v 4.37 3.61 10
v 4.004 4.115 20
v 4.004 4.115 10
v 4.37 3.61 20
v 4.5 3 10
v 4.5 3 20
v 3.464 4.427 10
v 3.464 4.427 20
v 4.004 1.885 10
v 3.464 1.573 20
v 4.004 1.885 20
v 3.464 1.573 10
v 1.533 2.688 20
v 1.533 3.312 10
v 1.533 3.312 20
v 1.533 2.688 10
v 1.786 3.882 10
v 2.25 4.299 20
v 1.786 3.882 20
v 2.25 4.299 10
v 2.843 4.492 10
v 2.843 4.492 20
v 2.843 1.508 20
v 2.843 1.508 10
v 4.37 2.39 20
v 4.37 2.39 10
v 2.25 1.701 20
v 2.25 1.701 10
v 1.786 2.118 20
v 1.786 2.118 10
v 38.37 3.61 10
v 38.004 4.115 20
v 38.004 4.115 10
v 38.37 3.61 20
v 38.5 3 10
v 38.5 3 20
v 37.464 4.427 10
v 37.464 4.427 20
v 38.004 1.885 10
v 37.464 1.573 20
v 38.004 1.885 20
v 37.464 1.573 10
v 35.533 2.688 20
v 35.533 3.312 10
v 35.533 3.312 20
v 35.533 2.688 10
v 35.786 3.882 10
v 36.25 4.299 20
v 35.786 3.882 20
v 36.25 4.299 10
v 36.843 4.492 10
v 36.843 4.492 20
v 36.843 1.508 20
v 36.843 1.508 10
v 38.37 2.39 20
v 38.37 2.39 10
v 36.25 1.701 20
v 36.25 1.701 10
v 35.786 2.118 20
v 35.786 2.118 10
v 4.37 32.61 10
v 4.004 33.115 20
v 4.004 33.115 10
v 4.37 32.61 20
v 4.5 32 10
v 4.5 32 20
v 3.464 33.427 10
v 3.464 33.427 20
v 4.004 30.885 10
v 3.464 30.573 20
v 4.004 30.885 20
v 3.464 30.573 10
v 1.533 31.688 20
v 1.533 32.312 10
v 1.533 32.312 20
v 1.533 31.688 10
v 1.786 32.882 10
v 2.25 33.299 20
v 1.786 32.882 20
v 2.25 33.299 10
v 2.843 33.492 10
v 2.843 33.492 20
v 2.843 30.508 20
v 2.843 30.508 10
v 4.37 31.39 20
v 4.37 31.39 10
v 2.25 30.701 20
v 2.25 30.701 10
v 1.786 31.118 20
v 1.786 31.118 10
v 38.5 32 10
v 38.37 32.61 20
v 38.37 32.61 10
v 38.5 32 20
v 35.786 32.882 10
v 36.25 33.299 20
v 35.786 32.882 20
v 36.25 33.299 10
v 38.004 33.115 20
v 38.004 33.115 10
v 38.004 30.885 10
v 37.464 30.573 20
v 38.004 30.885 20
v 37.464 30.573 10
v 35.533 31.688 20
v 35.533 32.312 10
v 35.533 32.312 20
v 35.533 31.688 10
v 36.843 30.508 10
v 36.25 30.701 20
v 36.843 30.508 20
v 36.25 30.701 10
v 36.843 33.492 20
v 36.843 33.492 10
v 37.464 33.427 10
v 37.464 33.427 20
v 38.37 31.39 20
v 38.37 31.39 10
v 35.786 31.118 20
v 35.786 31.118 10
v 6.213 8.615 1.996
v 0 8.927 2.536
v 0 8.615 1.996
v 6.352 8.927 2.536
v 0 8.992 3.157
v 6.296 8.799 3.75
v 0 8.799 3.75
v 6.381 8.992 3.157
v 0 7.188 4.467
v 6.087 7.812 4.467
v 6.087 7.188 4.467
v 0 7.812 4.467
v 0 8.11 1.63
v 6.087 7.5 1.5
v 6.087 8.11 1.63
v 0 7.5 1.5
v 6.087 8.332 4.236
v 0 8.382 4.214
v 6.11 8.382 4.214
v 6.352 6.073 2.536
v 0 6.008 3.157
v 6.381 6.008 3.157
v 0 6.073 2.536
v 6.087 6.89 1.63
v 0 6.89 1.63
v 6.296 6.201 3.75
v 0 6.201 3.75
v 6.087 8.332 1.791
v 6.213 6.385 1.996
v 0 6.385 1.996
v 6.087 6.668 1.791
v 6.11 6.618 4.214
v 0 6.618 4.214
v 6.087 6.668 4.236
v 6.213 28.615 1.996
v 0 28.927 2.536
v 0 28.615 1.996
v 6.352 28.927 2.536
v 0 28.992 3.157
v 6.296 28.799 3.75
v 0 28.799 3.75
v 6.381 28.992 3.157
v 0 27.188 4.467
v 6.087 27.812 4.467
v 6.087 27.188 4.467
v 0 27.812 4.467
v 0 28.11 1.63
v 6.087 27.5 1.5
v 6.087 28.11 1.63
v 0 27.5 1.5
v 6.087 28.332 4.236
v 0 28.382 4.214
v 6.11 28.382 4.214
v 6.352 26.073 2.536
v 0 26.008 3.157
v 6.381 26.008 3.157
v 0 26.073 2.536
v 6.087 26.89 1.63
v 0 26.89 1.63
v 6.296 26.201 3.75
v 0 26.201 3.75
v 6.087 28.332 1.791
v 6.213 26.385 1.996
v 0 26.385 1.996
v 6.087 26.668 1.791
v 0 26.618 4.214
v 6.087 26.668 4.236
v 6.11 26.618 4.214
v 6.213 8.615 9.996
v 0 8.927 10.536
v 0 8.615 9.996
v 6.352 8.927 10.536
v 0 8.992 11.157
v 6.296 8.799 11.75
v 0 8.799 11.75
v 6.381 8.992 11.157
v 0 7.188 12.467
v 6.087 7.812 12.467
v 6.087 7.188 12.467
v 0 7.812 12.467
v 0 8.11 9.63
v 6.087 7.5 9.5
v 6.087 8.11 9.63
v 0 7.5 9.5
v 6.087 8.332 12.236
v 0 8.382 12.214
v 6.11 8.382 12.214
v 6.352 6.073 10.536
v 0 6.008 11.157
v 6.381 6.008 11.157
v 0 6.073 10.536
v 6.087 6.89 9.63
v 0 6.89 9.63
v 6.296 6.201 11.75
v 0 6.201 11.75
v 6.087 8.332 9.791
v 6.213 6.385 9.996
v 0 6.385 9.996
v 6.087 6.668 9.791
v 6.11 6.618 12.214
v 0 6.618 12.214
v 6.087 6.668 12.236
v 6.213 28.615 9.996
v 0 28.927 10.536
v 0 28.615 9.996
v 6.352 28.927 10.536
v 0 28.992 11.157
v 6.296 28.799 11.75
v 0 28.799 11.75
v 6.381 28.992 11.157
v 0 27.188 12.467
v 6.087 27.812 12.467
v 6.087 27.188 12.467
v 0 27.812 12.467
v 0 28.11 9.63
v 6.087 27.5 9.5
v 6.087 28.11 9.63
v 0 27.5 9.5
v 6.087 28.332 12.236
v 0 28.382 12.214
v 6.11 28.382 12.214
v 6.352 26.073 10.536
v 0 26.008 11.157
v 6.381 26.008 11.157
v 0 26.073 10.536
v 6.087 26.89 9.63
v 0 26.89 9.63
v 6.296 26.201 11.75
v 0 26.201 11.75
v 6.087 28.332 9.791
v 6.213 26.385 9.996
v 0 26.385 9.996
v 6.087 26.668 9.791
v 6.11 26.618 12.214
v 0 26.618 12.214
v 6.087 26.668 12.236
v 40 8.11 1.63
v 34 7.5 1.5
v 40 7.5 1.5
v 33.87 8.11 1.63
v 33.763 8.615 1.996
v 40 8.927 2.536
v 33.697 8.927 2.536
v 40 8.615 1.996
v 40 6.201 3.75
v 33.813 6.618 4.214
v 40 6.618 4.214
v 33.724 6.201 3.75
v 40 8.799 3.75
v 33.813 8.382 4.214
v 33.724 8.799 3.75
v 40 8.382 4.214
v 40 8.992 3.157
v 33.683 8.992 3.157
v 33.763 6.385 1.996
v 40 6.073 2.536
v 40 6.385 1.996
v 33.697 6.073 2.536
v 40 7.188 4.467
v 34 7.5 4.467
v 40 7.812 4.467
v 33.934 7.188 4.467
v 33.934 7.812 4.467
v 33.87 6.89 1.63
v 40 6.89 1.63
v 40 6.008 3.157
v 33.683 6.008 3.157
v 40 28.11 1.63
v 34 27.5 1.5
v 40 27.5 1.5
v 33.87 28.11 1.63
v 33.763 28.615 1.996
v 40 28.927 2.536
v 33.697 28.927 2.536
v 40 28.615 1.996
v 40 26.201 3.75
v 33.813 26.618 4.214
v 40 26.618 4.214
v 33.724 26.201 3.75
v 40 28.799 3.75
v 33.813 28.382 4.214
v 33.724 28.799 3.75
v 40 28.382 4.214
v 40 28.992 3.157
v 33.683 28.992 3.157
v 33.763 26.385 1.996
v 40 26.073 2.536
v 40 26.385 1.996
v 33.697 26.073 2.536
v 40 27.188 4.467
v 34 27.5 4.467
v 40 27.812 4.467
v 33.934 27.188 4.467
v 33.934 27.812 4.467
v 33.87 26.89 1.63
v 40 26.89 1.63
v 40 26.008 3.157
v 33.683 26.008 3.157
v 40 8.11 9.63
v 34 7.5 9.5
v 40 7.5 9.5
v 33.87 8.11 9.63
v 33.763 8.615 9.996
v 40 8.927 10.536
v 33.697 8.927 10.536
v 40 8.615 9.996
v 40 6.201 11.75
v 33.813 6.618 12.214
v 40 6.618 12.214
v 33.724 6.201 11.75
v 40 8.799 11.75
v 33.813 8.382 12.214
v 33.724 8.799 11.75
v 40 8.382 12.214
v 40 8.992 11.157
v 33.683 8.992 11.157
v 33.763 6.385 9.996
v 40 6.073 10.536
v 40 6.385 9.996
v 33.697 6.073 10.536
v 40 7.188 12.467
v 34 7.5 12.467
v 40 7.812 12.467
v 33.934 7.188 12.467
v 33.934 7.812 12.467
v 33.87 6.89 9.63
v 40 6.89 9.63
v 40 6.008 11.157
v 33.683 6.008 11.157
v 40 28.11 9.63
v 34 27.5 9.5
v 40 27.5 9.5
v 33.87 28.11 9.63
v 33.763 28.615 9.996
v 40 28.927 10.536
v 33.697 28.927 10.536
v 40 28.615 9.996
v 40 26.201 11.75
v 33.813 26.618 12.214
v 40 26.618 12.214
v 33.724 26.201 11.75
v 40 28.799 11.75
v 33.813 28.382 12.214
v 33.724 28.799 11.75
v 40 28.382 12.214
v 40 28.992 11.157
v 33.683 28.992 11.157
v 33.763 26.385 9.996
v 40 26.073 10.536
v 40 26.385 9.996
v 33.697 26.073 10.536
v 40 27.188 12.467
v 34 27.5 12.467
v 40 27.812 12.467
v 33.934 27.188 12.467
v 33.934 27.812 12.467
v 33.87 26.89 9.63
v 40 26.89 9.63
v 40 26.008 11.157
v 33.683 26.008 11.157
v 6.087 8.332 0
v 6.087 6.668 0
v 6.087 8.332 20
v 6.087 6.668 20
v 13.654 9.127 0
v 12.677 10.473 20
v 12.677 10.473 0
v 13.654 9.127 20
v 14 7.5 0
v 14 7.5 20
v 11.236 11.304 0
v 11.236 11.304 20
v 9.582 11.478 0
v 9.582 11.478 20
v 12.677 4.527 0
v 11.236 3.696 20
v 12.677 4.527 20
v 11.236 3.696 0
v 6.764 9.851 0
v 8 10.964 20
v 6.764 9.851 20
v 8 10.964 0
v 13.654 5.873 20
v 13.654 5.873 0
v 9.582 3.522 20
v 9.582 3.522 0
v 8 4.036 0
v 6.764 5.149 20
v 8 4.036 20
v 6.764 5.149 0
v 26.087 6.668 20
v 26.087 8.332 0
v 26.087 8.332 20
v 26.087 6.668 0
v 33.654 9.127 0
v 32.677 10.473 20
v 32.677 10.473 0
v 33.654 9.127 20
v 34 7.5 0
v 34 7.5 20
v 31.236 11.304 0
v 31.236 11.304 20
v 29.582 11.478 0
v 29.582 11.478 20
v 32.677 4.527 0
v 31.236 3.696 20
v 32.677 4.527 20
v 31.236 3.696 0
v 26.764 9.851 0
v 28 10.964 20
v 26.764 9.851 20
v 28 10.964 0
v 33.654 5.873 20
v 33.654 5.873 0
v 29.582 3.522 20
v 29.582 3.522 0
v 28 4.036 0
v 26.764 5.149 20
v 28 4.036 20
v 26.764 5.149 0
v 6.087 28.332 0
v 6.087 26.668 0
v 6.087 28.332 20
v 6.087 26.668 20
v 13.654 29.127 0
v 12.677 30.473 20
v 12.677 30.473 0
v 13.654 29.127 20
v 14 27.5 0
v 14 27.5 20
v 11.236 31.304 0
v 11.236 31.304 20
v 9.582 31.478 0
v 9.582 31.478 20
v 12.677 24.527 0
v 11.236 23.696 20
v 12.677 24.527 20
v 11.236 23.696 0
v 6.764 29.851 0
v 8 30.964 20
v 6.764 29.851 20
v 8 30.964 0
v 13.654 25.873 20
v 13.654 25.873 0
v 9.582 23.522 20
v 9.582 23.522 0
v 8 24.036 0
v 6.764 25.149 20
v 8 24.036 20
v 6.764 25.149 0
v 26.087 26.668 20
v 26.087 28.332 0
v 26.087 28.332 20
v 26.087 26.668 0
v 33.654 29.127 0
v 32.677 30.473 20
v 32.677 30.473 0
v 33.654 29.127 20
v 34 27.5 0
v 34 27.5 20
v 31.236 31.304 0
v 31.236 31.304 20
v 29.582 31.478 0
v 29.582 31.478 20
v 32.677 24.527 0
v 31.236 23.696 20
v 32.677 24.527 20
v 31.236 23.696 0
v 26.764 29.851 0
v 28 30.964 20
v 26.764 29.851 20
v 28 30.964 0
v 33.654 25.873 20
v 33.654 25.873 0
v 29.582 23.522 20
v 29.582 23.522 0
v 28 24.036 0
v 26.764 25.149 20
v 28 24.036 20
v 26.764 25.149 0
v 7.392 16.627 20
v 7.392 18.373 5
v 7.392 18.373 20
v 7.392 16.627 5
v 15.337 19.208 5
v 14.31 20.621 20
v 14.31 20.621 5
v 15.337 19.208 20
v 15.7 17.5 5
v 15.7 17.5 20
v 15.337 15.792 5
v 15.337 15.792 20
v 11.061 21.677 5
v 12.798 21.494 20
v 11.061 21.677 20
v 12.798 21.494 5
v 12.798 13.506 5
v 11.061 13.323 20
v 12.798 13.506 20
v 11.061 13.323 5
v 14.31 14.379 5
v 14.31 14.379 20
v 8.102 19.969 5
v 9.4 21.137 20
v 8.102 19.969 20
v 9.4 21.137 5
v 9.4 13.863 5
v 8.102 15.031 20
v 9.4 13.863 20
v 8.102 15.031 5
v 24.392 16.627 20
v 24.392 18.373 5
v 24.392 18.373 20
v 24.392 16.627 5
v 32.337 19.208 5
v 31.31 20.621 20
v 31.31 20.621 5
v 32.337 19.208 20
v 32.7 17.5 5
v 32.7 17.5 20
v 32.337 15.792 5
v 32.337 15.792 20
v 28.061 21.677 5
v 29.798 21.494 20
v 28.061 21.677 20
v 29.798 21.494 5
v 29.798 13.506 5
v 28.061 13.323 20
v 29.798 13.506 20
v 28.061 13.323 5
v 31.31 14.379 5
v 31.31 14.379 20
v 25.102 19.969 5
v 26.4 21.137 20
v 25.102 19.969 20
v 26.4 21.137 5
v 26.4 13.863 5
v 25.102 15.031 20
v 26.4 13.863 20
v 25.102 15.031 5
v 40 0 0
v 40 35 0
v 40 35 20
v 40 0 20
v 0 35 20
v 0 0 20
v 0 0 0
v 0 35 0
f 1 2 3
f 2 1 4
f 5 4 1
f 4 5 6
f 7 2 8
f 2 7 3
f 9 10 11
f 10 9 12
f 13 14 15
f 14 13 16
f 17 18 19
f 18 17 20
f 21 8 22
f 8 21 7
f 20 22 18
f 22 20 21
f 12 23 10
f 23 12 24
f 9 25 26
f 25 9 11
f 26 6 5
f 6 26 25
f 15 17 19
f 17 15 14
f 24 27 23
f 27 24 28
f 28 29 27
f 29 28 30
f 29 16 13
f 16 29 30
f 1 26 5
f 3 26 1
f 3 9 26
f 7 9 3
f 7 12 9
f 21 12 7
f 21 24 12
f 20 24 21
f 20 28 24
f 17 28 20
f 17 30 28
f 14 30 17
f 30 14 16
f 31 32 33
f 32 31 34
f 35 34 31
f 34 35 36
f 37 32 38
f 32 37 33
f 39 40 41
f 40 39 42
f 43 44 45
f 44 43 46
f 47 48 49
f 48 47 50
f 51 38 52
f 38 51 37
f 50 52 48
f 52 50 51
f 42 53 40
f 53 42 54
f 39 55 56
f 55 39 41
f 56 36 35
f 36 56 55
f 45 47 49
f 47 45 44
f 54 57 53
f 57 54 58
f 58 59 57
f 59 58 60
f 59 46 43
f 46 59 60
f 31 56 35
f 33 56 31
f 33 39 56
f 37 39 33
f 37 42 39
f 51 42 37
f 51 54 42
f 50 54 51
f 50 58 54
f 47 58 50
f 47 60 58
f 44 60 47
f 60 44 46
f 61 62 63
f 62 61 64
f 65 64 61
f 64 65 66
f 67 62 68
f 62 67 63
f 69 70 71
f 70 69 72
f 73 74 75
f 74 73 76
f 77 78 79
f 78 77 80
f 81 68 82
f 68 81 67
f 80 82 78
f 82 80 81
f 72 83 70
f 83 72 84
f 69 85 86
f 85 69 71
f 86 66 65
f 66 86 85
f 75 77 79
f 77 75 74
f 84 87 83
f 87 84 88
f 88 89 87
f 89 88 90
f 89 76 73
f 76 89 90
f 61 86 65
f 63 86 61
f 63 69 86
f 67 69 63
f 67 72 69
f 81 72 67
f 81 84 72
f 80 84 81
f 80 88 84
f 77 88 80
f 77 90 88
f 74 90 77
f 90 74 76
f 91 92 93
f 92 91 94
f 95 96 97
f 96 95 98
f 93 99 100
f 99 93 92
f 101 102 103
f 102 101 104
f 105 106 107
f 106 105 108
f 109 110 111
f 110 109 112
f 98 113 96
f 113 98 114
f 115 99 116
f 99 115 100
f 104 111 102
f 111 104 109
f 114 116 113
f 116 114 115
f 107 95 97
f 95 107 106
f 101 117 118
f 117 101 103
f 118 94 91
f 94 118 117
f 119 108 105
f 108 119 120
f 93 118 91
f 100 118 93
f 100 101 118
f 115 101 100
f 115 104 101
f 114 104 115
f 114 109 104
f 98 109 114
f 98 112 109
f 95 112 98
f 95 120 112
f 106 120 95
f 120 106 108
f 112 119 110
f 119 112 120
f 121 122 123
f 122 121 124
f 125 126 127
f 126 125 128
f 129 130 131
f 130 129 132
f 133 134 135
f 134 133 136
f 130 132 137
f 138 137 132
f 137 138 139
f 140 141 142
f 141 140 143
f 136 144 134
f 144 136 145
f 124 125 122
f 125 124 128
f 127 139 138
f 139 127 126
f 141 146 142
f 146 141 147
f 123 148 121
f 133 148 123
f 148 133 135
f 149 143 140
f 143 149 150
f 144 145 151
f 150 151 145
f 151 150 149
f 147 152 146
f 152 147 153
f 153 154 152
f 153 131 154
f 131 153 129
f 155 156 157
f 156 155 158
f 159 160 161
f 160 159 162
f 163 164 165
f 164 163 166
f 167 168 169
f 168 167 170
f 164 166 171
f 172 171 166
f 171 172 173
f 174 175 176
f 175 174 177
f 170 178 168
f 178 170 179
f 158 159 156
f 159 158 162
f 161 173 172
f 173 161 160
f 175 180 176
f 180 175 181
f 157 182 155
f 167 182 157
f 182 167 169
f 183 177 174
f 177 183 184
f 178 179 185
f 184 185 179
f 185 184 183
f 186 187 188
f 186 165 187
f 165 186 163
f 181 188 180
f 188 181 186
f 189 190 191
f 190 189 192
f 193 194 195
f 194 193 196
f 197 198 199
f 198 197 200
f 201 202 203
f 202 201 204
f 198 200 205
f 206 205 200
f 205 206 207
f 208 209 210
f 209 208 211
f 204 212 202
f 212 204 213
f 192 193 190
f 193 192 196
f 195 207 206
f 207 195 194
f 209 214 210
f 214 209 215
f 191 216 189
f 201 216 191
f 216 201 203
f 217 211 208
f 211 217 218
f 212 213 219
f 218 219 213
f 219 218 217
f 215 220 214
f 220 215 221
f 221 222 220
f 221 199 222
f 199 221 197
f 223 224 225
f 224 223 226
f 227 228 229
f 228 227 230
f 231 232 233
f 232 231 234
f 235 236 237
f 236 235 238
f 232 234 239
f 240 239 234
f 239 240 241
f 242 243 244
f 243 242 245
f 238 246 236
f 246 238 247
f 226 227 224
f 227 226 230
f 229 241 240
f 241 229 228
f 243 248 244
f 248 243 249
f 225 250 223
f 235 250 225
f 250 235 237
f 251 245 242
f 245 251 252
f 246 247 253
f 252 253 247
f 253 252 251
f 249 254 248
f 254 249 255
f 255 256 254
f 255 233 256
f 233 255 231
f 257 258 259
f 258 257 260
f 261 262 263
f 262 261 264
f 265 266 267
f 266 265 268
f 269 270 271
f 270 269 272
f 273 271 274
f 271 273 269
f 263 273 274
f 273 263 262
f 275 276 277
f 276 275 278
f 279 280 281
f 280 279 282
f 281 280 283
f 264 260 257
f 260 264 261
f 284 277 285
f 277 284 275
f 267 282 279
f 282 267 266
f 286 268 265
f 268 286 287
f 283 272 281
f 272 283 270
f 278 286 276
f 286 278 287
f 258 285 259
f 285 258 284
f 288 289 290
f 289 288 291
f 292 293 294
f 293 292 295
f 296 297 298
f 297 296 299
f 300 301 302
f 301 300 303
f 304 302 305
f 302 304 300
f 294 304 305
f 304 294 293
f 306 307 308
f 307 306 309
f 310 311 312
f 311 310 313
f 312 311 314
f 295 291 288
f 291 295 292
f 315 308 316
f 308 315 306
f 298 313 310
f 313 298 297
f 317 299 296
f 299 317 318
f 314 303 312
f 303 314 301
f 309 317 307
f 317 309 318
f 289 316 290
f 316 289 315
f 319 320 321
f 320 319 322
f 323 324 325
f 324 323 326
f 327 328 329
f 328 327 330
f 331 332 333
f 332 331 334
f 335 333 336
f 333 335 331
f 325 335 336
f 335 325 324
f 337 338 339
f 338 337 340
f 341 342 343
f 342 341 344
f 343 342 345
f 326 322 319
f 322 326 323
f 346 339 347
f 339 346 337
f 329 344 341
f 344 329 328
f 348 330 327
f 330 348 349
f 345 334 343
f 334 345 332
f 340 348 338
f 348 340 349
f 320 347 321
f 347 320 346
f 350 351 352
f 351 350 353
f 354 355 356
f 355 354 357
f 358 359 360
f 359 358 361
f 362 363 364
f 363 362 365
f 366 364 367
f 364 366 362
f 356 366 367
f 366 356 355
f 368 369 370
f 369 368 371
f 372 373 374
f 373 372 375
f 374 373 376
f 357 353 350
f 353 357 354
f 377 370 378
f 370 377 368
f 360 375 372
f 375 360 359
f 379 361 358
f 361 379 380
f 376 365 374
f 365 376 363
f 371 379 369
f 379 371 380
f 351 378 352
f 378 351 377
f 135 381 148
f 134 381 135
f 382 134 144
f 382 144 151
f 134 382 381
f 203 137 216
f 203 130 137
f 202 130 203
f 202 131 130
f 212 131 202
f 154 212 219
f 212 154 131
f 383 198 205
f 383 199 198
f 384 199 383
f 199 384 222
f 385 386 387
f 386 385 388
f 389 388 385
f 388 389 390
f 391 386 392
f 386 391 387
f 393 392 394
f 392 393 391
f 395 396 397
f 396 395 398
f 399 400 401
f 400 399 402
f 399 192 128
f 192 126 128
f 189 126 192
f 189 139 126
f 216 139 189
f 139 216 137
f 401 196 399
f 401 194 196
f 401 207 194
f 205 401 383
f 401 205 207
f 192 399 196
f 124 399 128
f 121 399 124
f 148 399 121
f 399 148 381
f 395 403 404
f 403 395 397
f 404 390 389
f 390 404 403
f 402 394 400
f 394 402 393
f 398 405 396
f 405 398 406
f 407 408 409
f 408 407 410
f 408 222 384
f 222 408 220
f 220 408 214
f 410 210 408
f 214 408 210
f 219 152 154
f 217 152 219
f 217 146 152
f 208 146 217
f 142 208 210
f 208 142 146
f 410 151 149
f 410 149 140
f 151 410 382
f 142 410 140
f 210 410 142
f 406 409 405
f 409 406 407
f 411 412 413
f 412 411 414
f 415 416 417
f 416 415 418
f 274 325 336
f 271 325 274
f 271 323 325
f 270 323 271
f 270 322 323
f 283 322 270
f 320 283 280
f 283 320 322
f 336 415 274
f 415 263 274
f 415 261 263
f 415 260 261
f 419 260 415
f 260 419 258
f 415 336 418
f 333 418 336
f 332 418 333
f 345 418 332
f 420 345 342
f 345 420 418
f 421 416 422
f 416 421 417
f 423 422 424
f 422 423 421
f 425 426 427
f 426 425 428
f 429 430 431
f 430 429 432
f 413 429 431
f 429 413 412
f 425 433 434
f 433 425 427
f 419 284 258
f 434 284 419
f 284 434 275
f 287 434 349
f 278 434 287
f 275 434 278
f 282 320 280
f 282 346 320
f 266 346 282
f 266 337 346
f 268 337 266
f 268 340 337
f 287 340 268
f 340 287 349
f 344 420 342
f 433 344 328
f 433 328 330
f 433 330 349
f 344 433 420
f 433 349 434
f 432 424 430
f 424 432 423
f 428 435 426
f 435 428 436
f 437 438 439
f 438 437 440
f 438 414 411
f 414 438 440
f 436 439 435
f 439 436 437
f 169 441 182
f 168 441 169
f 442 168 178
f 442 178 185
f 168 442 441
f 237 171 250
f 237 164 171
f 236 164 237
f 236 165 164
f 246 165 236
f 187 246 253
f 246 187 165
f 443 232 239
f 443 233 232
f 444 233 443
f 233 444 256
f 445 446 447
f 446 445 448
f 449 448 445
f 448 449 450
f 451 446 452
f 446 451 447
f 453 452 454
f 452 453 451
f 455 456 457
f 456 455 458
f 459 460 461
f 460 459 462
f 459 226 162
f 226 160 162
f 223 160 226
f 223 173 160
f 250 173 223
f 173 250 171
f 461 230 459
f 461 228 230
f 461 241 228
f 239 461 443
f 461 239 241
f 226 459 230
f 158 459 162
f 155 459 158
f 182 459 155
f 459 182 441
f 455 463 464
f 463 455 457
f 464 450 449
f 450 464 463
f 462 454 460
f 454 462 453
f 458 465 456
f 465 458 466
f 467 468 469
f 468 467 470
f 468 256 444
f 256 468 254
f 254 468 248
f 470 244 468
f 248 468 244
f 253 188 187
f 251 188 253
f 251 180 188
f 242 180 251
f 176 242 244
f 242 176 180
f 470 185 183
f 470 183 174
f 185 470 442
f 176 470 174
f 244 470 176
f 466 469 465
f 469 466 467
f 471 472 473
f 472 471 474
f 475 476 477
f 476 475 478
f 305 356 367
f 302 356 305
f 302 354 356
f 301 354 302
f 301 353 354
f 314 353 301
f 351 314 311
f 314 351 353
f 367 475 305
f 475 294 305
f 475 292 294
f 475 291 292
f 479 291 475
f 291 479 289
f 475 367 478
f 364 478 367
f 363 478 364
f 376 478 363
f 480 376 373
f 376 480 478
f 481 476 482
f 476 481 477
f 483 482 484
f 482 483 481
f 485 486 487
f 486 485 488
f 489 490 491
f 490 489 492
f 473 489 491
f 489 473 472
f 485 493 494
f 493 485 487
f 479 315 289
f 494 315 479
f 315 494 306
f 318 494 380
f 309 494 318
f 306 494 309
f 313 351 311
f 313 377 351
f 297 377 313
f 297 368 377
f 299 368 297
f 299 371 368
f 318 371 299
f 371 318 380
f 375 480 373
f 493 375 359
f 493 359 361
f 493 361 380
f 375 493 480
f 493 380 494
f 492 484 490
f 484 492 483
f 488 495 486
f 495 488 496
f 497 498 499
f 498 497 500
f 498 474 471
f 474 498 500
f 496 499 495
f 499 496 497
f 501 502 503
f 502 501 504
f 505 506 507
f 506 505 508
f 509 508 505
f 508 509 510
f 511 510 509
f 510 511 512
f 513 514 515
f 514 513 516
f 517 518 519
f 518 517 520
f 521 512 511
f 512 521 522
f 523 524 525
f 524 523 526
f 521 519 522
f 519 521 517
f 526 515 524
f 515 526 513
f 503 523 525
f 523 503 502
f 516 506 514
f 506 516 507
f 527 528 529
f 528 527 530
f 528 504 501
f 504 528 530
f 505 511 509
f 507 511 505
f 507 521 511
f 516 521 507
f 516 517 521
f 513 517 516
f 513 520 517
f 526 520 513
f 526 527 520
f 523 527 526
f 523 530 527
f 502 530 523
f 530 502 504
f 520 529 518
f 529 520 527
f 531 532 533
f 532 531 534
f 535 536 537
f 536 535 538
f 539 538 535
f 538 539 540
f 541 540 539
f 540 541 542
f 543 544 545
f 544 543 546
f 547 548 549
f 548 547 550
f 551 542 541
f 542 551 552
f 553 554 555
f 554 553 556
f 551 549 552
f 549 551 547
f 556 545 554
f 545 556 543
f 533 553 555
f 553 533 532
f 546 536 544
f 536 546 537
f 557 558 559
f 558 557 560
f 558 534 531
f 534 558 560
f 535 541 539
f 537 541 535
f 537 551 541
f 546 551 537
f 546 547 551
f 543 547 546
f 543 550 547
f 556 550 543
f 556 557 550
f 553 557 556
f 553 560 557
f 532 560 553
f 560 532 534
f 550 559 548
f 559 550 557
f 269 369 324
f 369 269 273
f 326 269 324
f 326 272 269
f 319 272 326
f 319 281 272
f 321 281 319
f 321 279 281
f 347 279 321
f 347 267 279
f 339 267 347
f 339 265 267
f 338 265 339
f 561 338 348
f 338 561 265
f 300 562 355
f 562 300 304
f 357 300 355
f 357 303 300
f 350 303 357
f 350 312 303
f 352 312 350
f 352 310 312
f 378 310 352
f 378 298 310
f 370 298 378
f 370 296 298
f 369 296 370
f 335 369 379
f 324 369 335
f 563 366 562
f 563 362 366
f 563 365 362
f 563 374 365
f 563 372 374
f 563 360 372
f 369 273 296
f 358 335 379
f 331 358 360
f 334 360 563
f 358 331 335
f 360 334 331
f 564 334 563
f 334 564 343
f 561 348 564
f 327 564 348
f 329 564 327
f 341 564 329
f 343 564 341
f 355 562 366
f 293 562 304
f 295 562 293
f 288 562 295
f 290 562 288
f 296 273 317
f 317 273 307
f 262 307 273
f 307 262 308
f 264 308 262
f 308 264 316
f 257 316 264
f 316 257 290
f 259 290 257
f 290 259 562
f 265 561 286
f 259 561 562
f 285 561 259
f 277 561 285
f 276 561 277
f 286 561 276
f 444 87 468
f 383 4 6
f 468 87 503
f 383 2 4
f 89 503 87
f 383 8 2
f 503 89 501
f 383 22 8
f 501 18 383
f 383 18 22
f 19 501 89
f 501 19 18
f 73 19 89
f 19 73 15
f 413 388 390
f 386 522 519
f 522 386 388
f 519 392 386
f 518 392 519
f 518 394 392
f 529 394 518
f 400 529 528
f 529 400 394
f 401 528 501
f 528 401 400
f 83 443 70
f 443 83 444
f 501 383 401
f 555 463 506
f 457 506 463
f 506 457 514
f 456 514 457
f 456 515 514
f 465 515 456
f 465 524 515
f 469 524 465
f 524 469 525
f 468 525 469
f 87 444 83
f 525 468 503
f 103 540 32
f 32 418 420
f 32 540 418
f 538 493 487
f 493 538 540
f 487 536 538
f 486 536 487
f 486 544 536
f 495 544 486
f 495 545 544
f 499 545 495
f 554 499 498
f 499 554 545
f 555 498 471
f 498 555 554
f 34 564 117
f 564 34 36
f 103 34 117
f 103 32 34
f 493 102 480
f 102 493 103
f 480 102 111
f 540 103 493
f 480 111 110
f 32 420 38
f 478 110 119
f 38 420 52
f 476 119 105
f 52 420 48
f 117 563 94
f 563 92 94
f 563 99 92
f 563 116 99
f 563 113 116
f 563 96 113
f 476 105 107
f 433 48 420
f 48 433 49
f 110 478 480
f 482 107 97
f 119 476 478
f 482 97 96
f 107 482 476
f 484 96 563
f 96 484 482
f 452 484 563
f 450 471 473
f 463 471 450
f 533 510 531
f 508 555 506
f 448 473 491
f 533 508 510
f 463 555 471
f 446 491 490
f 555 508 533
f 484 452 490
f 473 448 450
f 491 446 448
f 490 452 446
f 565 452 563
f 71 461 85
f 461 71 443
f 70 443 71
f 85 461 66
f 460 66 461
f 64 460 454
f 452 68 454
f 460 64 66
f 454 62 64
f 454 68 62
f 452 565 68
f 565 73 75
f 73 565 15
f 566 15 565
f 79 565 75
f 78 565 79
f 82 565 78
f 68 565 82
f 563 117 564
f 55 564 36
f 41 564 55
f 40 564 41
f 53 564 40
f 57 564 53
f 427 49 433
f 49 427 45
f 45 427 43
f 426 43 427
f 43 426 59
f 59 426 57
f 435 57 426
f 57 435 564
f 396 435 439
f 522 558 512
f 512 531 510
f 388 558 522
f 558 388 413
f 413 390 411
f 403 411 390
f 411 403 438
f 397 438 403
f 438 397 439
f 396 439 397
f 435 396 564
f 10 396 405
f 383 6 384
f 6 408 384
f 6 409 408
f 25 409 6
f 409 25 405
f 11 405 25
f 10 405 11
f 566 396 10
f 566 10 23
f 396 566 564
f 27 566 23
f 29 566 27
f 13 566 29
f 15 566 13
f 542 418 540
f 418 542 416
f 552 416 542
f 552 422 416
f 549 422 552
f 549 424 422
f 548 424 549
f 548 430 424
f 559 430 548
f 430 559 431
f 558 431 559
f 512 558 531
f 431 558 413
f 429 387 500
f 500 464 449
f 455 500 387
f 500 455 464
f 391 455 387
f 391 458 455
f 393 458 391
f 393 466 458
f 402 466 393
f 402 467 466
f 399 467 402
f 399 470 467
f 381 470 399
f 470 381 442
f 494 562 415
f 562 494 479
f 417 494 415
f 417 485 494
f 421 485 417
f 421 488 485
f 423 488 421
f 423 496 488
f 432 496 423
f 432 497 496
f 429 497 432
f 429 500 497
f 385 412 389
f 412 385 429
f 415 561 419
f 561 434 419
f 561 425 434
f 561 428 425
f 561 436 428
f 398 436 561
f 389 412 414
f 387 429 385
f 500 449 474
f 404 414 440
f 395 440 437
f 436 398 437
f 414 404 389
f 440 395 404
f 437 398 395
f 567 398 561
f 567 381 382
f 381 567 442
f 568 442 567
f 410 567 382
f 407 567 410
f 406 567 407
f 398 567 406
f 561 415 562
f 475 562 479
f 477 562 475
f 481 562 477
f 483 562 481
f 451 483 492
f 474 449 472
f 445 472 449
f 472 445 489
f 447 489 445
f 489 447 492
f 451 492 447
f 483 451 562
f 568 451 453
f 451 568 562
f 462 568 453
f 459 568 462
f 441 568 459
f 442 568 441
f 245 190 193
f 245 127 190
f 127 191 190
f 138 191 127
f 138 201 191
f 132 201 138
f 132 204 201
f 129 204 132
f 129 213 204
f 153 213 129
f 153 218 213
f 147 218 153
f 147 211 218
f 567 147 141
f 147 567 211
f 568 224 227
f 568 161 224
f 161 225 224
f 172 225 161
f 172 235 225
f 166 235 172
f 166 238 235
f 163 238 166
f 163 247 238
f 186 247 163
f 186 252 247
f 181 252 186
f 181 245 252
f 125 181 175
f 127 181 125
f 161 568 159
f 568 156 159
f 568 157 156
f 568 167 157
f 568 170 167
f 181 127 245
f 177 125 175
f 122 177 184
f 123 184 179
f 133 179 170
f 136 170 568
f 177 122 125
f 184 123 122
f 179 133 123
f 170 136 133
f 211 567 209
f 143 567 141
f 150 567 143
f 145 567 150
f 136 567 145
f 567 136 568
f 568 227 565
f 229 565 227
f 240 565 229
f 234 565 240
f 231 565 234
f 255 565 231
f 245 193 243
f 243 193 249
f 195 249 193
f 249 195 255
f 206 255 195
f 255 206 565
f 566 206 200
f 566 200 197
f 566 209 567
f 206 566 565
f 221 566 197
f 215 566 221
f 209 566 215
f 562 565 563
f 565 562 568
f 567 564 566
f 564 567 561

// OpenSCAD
// Copyright 2017 Pavel Penev
// https://www.thingiverse.com/pavpen/about
//
// You can use this file under Attribution-ShareAlike 4.0 International
// (CC BY-SA 4.0).
//
// If you need to use it under another license, send me a message.

outer_dimensions = [40, 35, 20];

mount_screw_centers = [
    [                      3,                       3],
    [outer_dimensions[0] - 3,                       3],
    [                      3, outer_dimensions[1] - 3],
    [outer_dimensions[0] - 3, outer_dimensions[1] - 3]
];
mount_screw_r = 3 / 2;
mount_screw_hole_depth = 10;
mount_screw_hole_fn = 15;

grub_screw_hole_centers_one_side = [
    [                      7.5,  3],
    [outer_dimensions[1] - 7.5,  3],
    [                      7.5, 11],
    [outer_dimensions[1] - 7.5, 11]
];
grub_screw_hole_depth = 10;
grub_screw_hole_fn = 15;
grub_screw_h = 4;
grub_screw_r = 3 / 2;

heat_break_hole_centers = [
    [                      10,                       7.5],
    [outer_dimensions[0] - 10,                       7.5],
    [                      10, outer_dimensions[1] - 7.5],
    [outer_dimensions[0] - 10, outer_dimensions[1] - 7.5]
];
heat_break_hole_r = 8 / 2;
heat_break_hole_fn = 15;

water_path_hole_centers = [
    [                      11.5, outer_dimensions[1] / 2],
    [outer_dimensions[0] - 11.5, outer_dimensions[1] / 2]
];
water_path_hole_r = 8.4 / 2;
water_path_hole_depth = 15;
water_path_hole_fn = 15;

// Export functions:
function pro_pavpen_e3d_kraken_cooler_block_outer_dimensions() =
    outer_dimensions;

function pro_pavpen_e3d_kraken_cooler_block_mount_screw_r() =
    mount_screw_r;

function pro_pavpen_e3d_kraken_cooler_block_heat_break_hole_r() =
    heat_break_hole_r;

function pro_pavpen_e3d_kraken_cooler_block_water_path_hole_r() =
    water_path_hole_r;



// Demo:
pro_pavpen_e3d_kraken_cooler_block();



module pro_pavpen_e3d_kraken_cooler_block()
{
    difference()
    {
        // Main block:
        cube(outer_dimensions);
        
        // Mount screws holes:
        pro_pavpen_e3d_kraken_cooler_block_position_as_mount_screws()
        cylinder(
            r = mount_screw_r,
            h = mount_screw_hole_depth + 1,
            $fn = mount_screw_hole_fn);
        
        // Grub screw holes:
        pro_pavpen_e3d_kraken_cooler_block_position_as_grub_screws()
        rotate([0, 90, 0])
        translate([0, 0, -1])
        cylinder(
            r = grub_screw_r,
            h = grub_screw_hole_depth + 1,
            $fn = grub_screw_hole_fn);
        
        // Heat break holes:
        translate([0, 0, -1])
        pro_pavpen_e3d_kraken_cooler_block_position_as_heat_break_holes()
        cylinder(
            r = heat_break_hole_r,
            h = outer_dimensions[2] + 2,
            $fn = heat_break_hole_fn);
        
        // Water path holes:
        pro_pavpen_e3d_kraken_cooler_block_position_as_water_path_holes()
        cylinder(
            r = water_path_hole_r,
            h = water_path_hole_depth + 1,
            $fn = water_path_hole_fn);
    }
}

module pro_pavpen_e3d_kraken_cooler_block_position_as_mount_screws(
    use_z_offset = true
)
{
    union()
    {
        for (xy_offset = mount_screw_centers)
        {
            translate([
                xy_offset[0],
                xy_offset[1],
                use_z_offset ?
                    outer_dimensions[2] - mount_screw_hole_depth : 0])
            children();
        }
    }
}

module pro_pavpen_e3d_kraken_cooler_block_position_as_grub_screws_one_side()
{
    union()
    {
        for (yz_offset = grub_screw_hole_centers_one_side)
        {
            translate([0, yz_offset[0], yz_offset[1]])
            children();
        }
    }
}

module pro_pavpen_e3d_kraken_cooler_block_position_as_grub_screws(
    mirror_along_x = true
)
{
    union()
    {
        pro_pavpen_e3d_kraken_cooler_block_position_as_grub_screws_one_side()
        children();
        
        pro_pavpen_e3d_kraken_cooler_block_position_as_grub_screws_one_side()
        translate([outer_dimensions[0], 0, 0])
        scale([mirror_along_x ? -1 : 1, 1, 1])
        children();
    }
}

module pro_pavpen_e3d_kraken_cooler_block_position_as_heat_break_holes(
    mirror_along_x = false,
    mirror_along_y = false
)
{
    union()
    {
        for (i = [0 : len(heat_break_hole_centers) - 1])
        {
            xy_offset = heat_break_hole_centers[i];
            translate([
                xy_offset[0],
                xy_offset[1],
                0])
            scale([
                mirror_along_x && i % 2 == 1 ? -1 : 1,
                mirror_along_y && floor(i / 2) % 2 == 1 ? -1 : 1,
                1])
            children();
        }
    }
}

module pro_pavpen_e3d_kraken_cooler_block_position_as_water_path_holes(
    use_z_offset = true
)
{
    union()
    {
        for (xy_offset = water_path_hole_centers)
        {
            translate([
                xy_offset[0],
                xy_offset[1],
                use_z_offset ? outer_dimensions[2] - water_path_hole_depth : 0])
            children();
        }
    }
}
